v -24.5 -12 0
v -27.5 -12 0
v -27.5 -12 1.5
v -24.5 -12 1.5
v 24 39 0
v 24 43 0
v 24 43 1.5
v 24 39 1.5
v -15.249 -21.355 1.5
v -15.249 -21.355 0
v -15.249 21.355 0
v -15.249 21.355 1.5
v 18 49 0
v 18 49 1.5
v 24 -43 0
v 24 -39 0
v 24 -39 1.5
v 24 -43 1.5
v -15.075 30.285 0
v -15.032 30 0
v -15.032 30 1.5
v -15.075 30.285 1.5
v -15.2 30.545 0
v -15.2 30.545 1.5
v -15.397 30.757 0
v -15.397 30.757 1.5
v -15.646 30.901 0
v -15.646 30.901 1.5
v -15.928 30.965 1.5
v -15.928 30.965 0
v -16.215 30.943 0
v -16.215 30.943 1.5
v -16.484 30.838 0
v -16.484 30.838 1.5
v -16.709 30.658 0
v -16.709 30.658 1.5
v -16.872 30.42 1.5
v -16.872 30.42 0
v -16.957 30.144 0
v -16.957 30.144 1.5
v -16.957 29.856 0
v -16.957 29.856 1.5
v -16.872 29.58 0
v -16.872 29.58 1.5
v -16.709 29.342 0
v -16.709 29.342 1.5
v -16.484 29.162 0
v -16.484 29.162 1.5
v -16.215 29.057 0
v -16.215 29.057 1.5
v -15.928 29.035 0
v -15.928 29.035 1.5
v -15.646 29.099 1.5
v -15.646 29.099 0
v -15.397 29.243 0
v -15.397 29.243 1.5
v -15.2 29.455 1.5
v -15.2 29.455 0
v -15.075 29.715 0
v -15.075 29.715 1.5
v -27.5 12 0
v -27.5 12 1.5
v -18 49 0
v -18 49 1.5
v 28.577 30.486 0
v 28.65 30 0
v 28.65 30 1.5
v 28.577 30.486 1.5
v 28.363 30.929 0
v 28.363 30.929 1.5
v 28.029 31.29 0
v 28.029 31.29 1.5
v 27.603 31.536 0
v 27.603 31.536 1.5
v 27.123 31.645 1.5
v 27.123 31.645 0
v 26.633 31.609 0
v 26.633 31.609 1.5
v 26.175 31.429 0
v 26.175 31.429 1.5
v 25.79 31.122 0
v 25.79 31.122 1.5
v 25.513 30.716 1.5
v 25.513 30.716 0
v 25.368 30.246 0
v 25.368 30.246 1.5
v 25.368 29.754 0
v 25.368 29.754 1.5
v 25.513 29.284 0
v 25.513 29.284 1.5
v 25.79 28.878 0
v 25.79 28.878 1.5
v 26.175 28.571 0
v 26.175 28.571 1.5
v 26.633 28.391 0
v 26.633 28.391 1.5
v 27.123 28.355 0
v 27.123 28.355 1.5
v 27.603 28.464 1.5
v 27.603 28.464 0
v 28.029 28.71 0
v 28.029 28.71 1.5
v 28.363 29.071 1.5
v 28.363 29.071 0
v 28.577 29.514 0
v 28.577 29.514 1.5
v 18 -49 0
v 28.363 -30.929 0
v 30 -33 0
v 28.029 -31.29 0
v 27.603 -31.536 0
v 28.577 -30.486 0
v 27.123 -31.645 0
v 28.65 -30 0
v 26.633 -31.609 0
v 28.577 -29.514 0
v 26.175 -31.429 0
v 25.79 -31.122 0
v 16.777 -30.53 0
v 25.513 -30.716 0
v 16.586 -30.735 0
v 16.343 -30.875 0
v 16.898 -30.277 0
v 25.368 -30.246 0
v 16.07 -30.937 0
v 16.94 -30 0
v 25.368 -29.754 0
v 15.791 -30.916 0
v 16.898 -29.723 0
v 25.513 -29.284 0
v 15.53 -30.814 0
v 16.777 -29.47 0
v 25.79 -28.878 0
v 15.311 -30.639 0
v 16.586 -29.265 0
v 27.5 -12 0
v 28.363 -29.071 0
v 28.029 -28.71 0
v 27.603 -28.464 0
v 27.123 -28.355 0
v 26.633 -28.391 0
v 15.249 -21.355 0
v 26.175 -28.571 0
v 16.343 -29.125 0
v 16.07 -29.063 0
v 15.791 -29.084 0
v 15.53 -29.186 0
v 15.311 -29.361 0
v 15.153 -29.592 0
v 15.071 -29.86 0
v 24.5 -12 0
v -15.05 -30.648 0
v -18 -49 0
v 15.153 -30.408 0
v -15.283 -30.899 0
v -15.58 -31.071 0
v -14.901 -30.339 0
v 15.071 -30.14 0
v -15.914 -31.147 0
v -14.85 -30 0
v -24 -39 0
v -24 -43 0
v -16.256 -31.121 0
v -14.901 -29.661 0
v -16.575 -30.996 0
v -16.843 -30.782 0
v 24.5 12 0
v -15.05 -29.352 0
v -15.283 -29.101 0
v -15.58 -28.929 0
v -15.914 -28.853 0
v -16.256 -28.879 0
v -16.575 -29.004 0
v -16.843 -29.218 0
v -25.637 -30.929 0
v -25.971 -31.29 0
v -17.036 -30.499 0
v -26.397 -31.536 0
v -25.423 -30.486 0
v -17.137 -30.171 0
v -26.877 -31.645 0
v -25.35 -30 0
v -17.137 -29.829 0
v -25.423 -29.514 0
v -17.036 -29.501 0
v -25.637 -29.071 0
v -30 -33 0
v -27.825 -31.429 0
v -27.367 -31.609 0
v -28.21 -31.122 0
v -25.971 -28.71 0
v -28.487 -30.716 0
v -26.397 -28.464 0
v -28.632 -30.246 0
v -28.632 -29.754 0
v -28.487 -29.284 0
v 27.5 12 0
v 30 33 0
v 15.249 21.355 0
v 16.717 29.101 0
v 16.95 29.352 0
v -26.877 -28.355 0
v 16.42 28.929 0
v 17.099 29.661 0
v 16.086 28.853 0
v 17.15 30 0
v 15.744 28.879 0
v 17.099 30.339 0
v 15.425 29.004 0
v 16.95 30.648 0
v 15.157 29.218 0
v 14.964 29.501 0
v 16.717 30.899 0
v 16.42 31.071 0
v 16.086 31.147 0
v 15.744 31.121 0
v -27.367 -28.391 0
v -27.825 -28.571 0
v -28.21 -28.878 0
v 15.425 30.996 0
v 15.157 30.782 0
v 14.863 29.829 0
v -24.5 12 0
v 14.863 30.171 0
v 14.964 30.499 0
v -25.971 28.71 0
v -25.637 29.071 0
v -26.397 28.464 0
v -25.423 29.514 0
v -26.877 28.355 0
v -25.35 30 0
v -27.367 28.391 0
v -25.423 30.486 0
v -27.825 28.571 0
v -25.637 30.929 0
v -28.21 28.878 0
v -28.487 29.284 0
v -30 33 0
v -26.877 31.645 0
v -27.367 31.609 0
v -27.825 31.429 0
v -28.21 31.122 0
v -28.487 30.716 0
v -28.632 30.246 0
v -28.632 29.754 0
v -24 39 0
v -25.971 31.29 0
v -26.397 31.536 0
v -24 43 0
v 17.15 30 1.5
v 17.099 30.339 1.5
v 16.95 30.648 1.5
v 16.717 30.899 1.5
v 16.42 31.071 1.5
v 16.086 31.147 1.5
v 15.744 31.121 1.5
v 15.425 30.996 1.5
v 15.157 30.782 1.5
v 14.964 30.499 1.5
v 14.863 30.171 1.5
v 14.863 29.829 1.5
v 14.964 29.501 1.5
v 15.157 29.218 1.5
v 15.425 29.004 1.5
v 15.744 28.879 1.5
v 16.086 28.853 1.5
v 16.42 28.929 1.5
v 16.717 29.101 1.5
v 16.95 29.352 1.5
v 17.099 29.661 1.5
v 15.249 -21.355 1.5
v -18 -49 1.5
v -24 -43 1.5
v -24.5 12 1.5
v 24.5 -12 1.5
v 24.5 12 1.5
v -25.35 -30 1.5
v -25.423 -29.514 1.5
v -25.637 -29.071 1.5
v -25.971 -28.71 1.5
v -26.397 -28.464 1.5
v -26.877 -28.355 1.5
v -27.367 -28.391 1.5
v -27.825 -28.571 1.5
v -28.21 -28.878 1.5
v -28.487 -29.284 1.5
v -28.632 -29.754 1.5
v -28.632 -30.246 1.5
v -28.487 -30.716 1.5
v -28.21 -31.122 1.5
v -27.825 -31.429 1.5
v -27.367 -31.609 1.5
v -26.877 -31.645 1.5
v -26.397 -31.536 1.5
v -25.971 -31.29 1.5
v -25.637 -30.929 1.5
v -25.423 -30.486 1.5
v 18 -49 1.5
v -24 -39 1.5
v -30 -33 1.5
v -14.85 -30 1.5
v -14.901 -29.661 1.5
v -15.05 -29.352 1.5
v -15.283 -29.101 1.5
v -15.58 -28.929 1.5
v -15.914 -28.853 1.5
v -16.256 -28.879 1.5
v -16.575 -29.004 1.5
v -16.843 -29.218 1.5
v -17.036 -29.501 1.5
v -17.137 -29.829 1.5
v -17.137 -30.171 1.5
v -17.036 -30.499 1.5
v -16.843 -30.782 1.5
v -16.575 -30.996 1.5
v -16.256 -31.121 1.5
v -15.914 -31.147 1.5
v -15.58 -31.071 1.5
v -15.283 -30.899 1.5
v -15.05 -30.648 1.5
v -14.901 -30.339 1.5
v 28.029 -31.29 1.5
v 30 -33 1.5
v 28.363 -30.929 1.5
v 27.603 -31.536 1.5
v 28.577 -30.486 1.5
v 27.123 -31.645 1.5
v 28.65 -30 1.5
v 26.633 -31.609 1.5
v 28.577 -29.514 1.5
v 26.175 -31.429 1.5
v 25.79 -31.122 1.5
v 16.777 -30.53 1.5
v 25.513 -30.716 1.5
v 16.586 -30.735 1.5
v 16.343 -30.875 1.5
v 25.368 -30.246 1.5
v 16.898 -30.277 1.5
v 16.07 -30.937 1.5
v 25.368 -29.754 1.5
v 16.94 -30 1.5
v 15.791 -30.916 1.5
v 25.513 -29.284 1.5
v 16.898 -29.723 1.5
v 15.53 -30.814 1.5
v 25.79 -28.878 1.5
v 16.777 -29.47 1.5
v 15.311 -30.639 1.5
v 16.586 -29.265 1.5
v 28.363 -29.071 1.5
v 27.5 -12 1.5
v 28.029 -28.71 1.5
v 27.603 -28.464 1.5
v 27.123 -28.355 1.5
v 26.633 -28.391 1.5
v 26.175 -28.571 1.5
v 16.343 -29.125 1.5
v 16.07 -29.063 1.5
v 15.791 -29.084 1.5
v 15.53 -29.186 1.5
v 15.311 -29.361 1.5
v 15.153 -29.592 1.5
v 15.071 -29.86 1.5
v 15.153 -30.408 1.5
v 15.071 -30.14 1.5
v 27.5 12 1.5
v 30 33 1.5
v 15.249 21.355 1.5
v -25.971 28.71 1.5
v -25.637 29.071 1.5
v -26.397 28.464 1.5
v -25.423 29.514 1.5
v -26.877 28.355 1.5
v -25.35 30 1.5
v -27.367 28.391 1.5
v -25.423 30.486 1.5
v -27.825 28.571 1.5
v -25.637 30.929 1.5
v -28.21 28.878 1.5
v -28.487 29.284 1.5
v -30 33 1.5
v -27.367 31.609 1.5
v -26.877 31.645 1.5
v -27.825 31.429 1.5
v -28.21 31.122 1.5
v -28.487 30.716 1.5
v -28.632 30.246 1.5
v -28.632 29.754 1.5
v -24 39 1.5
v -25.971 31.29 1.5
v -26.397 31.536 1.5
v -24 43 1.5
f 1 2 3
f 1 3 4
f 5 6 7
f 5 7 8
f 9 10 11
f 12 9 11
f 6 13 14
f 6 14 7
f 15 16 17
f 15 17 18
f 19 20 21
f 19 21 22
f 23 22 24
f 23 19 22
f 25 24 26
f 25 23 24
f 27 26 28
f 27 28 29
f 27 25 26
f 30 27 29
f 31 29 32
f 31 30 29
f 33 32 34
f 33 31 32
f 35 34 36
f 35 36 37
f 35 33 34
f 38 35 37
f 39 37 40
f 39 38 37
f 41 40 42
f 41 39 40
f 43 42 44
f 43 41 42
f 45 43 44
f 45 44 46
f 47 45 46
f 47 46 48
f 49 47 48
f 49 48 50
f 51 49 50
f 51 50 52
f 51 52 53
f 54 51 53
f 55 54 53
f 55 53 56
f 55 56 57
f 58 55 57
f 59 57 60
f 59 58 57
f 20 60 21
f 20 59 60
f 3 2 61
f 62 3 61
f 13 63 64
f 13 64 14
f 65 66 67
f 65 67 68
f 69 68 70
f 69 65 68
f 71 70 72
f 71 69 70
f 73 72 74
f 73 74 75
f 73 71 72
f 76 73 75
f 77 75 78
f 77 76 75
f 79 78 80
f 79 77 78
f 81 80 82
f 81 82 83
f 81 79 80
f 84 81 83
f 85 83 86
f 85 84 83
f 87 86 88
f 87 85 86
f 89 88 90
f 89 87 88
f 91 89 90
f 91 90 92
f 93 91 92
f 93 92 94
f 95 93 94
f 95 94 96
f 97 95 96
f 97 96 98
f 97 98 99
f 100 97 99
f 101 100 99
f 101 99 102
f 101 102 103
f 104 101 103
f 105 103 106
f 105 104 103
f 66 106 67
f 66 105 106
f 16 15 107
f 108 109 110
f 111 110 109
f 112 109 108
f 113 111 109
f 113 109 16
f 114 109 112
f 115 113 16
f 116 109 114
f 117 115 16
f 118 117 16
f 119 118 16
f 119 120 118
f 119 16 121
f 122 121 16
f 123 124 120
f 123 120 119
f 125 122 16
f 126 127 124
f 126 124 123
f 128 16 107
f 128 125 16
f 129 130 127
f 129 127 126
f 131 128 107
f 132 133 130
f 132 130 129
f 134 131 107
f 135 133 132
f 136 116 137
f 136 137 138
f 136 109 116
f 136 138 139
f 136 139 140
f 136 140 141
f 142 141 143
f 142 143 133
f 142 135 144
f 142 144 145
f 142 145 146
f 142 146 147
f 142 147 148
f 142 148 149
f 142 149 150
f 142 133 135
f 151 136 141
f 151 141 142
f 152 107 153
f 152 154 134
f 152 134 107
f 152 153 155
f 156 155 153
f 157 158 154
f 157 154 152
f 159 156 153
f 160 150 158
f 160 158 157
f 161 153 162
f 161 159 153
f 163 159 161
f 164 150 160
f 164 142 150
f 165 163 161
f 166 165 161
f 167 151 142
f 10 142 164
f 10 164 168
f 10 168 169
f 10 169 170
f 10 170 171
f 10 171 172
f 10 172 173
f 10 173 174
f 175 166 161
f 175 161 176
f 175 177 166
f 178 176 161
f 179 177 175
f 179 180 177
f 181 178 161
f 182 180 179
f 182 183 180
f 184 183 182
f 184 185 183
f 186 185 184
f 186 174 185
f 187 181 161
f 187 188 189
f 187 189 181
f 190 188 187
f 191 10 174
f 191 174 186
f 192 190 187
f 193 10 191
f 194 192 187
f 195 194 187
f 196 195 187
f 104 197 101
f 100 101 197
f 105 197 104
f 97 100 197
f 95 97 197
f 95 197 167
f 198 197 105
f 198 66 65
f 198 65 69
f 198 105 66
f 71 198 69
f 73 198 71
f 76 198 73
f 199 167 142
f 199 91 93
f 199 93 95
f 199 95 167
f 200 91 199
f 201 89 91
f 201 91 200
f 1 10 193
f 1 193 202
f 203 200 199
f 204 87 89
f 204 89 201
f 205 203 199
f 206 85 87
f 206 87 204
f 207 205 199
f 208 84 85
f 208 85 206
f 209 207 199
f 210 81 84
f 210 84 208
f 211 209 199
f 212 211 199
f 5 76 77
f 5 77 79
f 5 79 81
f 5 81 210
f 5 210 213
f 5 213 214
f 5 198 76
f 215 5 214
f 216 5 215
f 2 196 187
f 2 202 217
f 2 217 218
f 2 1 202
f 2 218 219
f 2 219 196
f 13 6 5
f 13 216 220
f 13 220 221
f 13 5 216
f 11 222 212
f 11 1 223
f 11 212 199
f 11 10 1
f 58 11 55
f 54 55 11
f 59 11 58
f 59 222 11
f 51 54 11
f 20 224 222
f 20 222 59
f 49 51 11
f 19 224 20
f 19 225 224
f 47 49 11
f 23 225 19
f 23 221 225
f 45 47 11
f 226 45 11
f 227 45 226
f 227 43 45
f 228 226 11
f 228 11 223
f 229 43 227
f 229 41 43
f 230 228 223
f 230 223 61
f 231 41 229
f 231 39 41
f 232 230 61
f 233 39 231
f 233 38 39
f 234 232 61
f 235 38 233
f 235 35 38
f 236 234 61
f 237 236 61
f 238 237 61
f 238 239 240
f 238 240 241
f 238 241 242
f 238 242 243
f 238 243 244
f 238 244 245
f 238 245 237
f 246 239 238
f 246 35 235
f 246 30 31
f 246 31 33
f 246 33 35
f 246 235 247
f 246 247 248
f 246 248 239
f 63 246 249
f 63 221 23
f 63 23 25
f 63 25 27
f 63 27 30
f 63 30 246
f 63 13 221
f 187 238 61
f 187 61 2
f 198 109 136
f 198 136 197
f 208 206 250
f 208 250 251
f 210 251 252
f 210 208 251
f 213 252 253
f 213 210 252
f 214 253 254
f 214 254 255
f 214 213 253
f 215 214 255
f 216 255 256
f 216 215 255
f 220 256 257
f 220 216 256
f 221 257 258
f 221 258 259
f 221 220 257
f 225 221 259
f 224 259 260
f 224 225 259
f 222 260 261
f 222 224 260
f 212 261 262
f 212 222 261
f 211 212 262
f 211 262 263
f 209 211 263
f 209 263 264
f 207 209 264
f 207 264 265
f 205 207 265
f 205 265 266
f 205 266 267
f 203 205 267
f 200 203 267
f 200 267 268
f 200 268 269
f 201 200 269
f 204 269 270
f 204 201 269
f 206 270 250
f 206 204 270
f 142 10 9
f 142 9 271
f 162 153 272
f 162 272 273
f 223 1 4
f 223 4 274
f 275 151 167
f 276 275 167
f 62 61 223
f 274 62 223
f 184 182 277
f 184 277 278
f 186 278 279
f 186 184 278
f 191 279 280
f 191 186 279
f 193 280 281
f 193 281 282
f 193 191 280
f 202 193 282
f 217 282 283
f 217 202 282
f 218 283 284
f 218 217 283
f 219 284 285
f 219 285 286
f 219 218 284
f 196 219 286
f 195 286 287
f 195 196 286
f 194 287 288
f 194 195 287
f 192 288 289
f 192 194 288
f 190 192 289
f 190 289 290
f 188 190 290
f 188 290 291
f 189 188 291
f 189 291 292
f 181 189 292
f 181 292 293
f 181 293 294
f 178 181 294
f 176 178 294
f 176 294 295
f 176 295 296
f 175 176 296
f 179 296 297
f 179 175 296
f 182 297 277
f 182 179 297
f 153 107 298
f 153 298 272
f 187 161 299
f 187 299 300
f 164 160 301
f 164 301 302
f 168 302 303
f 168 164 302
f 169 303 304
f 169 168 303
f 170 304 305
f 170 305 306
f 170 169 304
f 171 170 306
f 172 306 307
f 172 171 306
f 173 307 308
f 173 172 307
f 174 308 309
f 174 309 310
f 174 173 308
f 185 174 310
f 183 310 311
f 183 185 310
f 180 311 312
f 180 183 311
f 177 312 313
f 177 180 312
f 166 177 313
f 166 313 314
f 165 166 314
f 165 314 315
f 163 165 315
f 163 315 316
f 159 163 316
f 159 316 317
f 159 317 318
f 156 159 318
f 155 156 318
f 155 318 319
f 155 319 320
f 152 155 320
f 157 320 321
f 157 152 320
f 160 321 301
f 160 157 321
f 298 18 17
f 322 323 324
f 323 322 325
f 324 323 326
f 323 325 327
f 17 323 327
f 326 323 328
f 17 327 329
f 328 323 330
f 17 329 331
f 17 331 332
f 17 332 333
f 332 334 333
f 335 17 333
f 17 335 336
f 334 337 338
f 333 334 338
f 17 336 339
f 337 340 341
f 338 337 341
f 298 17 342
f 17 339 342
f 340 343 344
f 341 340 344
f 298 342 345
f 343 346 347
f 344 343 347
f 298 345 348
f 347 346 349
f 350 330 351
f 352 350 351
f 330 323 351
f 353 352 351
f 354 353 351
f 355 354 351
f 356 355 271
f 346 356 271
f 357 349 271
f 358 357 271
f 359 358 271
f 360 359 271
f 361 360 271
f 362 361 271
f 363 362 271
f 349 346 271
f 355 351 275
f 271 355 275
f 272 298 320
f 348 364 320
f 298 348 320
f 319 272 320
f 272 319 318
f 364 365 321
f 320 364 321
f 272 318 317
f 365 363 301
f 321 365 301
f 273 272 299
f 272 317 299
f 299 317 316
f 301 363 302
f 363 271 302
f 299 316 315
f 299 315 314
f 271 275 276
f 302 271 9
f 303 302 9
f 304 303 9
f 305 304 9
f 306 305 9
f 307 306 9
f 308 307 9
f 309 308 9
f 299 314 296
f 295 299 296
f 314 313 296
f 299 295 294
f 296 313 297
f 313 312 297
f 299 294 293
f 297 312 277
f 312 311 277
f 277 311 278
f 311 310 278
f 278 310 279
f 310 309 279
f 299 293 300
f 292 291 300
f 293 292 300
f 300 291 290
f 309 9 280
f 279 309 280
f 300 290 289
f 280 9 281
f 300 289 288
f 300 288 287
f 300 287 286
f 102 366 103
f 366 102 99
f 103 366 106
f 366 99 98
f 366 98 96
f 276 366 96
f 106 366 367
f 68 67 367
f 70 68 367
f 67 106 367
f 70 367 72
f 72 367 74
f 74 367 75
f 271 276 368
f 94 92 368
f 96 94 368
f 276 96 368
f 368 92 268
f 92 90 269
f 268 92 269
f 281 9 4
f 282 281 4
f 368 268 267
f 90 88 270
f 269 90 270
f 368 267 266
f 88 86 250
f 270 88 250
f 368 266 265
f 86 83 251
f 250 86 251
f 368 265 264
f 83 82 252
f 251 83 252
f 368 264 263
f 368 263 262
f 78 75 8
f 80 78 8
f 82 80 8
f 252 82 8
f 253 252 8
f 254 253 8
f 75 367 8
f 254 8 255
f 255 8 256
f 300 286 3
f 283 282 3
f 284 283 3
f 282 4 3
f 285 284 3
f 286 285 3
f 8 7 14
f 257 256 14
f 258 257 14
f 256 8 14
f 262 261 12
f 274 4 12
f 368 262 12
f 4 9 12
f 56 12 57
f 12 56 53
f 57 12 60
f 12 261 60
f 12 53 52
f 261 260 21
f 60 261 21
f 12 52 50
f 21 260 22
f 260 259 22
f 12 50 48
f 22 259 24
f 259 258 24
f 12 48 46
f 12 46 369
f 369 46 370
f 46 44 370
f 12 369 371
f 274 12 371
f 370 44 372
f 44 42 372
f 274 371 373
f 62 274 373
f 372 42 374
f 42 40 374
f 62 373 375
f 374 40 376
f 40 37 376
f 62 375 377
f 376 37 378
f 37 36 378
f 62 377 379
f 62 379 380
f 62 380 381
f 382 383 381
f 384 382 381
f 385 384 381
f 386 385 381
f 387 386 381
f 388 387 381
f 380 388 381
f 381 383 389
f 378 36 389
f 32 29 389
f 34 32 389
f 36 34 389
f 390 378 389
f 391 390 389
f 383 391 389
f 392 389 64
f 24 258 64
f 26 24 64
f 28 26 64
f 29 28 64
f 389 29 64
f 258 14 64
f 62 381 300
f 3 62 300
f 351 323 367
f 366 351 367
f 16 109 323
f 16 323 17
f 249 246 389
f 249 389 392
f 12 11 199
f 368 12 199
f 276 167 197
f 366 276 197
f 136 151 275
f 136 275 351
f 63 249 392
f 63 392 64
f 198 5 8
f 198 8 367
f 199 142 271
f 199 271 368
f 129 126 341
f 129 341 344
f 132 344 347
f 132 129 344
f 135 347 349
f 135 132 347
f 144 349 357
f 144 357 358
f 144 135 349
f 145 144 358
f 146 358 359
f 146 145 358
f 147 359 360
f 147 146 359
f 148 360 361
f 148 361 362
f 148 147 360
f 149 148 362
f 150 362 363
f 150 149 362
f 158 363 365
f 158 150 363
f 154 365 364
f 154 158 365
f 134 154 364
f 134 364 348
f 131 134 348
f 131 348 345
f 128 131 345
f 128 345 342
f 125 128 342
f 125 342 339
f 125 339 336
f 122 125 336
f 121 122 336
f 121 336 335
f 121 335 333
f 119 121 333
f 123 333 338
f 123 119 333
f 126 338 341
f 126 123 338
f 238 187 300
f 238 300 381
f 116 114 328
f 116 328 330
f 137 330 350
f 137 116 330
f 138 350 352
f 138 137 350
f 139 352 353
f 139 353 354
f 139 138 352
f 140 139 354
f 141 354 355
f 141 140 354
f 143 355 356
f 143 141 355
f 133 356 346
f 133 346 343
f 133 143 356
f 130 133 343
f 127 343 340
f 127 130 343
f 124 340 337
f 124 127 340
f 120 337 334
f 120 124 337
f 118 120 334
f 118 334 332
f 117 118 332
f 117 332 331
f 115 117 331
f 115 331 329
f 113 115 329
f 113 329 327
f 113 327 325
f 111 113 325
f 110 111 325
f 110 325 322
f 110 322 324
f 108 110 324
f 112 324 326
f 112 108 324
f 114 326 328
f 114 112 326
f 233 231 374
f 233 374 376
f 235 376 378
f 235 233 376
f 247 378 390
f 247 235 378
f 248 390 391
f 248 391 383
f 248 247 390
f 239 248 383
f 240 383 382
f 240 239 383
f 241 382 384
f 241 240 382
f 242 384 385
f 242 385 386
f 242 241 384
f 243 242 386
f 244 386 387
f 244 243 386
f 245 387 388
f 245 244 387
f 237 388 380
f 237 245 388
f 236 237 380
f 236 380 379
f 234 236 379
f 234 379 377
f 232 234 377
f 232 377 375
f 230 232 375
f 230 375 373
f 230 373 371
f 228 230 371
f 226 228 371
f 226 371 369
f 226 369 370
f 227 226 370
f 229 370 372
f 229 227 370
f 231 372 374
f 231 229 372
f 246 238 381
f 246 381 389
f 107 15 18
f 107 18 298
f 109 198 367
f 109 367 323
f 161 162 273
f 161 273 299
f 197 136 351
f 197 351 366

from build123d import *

# Parameters (mm, degrees)
SKETCH_1_R       = 1.15
SKETCH_1_R_2     = 0.939967297
SKETCH_1_R_3     = 0.967686678
SKETCH_1_R_4     = 1.65
SKETCH_1_W       = 30.4982
SKETCH_1_H       = 42.7098
SKETCH_1_W_2     = 3
SKETCH_1_H_2     = 24
PIXHAWK_M3_DEPTH = 1.5


with BuildPart() as part:
    # 草图1 → Pixhawk正装减振托板_绑带槽_四M3孔 (new body)
    with BuildSketch(Plane.XY):
        Polygon((24, -39), (24, -43), (18, -49), (-18, -49), (-24, -43), (-24, -39), (-30, -33), (-30, 33), (-24, 39), (-24, 43), (-18, 49), (18, 49), (24, 43), (24, 39), (30, 33), (30, -33), align=None)
        with Locations((16, 30)):
            Circle(SKETCH_1_R, mode=Mode.SUBTRACT)
        with Locations((-16, -30)):
            Circle(SKETCH_1_R, mode=Mode.SUBTRACT)
        with Locations((16, -30)):
            Circle(SKETCH_1_R_2, mode=Mode.SUBTRACT)
        with Locations((-16, 30)):
            Circle(SKETCH_1_R_3, mode=Mode.SUBTRACT)
        with Locations((-27, -30)):
            Circle(SKETCH_1_R_4, mode=Mode.SUBTRACT)
        with Locations((-27, 30)):
            Circle(SKETCH_1_R_4, mode=Mode.SUBTRACT)
        with Locations((27, -30)):
            Circle(SKETCH_1_R_4, mode=Mode.SUBTRACT)
        with Locations((27, 30)):
            Circle(SKETCH_1_R_4, mode=Mode.SUBTRACT)
        Rectangle(SKETCH_1_W, SKETCH_1_H, mode=Mode.SUBTRACT)
        with Locations((-26, 0)):
            Rectangle(SKETCH_1_W_2, SKETCH_1_H_2, mode=Mode.SUBTRACT)
        with Locations((26, 0)):
            Rectangle(SKETCH_1_W_2, SKETCH_1_H_2, mode=Mode.SUBTRACT)
    extrude(amount=PIXHAWK_M3_DEPTH)


solid = part.part
